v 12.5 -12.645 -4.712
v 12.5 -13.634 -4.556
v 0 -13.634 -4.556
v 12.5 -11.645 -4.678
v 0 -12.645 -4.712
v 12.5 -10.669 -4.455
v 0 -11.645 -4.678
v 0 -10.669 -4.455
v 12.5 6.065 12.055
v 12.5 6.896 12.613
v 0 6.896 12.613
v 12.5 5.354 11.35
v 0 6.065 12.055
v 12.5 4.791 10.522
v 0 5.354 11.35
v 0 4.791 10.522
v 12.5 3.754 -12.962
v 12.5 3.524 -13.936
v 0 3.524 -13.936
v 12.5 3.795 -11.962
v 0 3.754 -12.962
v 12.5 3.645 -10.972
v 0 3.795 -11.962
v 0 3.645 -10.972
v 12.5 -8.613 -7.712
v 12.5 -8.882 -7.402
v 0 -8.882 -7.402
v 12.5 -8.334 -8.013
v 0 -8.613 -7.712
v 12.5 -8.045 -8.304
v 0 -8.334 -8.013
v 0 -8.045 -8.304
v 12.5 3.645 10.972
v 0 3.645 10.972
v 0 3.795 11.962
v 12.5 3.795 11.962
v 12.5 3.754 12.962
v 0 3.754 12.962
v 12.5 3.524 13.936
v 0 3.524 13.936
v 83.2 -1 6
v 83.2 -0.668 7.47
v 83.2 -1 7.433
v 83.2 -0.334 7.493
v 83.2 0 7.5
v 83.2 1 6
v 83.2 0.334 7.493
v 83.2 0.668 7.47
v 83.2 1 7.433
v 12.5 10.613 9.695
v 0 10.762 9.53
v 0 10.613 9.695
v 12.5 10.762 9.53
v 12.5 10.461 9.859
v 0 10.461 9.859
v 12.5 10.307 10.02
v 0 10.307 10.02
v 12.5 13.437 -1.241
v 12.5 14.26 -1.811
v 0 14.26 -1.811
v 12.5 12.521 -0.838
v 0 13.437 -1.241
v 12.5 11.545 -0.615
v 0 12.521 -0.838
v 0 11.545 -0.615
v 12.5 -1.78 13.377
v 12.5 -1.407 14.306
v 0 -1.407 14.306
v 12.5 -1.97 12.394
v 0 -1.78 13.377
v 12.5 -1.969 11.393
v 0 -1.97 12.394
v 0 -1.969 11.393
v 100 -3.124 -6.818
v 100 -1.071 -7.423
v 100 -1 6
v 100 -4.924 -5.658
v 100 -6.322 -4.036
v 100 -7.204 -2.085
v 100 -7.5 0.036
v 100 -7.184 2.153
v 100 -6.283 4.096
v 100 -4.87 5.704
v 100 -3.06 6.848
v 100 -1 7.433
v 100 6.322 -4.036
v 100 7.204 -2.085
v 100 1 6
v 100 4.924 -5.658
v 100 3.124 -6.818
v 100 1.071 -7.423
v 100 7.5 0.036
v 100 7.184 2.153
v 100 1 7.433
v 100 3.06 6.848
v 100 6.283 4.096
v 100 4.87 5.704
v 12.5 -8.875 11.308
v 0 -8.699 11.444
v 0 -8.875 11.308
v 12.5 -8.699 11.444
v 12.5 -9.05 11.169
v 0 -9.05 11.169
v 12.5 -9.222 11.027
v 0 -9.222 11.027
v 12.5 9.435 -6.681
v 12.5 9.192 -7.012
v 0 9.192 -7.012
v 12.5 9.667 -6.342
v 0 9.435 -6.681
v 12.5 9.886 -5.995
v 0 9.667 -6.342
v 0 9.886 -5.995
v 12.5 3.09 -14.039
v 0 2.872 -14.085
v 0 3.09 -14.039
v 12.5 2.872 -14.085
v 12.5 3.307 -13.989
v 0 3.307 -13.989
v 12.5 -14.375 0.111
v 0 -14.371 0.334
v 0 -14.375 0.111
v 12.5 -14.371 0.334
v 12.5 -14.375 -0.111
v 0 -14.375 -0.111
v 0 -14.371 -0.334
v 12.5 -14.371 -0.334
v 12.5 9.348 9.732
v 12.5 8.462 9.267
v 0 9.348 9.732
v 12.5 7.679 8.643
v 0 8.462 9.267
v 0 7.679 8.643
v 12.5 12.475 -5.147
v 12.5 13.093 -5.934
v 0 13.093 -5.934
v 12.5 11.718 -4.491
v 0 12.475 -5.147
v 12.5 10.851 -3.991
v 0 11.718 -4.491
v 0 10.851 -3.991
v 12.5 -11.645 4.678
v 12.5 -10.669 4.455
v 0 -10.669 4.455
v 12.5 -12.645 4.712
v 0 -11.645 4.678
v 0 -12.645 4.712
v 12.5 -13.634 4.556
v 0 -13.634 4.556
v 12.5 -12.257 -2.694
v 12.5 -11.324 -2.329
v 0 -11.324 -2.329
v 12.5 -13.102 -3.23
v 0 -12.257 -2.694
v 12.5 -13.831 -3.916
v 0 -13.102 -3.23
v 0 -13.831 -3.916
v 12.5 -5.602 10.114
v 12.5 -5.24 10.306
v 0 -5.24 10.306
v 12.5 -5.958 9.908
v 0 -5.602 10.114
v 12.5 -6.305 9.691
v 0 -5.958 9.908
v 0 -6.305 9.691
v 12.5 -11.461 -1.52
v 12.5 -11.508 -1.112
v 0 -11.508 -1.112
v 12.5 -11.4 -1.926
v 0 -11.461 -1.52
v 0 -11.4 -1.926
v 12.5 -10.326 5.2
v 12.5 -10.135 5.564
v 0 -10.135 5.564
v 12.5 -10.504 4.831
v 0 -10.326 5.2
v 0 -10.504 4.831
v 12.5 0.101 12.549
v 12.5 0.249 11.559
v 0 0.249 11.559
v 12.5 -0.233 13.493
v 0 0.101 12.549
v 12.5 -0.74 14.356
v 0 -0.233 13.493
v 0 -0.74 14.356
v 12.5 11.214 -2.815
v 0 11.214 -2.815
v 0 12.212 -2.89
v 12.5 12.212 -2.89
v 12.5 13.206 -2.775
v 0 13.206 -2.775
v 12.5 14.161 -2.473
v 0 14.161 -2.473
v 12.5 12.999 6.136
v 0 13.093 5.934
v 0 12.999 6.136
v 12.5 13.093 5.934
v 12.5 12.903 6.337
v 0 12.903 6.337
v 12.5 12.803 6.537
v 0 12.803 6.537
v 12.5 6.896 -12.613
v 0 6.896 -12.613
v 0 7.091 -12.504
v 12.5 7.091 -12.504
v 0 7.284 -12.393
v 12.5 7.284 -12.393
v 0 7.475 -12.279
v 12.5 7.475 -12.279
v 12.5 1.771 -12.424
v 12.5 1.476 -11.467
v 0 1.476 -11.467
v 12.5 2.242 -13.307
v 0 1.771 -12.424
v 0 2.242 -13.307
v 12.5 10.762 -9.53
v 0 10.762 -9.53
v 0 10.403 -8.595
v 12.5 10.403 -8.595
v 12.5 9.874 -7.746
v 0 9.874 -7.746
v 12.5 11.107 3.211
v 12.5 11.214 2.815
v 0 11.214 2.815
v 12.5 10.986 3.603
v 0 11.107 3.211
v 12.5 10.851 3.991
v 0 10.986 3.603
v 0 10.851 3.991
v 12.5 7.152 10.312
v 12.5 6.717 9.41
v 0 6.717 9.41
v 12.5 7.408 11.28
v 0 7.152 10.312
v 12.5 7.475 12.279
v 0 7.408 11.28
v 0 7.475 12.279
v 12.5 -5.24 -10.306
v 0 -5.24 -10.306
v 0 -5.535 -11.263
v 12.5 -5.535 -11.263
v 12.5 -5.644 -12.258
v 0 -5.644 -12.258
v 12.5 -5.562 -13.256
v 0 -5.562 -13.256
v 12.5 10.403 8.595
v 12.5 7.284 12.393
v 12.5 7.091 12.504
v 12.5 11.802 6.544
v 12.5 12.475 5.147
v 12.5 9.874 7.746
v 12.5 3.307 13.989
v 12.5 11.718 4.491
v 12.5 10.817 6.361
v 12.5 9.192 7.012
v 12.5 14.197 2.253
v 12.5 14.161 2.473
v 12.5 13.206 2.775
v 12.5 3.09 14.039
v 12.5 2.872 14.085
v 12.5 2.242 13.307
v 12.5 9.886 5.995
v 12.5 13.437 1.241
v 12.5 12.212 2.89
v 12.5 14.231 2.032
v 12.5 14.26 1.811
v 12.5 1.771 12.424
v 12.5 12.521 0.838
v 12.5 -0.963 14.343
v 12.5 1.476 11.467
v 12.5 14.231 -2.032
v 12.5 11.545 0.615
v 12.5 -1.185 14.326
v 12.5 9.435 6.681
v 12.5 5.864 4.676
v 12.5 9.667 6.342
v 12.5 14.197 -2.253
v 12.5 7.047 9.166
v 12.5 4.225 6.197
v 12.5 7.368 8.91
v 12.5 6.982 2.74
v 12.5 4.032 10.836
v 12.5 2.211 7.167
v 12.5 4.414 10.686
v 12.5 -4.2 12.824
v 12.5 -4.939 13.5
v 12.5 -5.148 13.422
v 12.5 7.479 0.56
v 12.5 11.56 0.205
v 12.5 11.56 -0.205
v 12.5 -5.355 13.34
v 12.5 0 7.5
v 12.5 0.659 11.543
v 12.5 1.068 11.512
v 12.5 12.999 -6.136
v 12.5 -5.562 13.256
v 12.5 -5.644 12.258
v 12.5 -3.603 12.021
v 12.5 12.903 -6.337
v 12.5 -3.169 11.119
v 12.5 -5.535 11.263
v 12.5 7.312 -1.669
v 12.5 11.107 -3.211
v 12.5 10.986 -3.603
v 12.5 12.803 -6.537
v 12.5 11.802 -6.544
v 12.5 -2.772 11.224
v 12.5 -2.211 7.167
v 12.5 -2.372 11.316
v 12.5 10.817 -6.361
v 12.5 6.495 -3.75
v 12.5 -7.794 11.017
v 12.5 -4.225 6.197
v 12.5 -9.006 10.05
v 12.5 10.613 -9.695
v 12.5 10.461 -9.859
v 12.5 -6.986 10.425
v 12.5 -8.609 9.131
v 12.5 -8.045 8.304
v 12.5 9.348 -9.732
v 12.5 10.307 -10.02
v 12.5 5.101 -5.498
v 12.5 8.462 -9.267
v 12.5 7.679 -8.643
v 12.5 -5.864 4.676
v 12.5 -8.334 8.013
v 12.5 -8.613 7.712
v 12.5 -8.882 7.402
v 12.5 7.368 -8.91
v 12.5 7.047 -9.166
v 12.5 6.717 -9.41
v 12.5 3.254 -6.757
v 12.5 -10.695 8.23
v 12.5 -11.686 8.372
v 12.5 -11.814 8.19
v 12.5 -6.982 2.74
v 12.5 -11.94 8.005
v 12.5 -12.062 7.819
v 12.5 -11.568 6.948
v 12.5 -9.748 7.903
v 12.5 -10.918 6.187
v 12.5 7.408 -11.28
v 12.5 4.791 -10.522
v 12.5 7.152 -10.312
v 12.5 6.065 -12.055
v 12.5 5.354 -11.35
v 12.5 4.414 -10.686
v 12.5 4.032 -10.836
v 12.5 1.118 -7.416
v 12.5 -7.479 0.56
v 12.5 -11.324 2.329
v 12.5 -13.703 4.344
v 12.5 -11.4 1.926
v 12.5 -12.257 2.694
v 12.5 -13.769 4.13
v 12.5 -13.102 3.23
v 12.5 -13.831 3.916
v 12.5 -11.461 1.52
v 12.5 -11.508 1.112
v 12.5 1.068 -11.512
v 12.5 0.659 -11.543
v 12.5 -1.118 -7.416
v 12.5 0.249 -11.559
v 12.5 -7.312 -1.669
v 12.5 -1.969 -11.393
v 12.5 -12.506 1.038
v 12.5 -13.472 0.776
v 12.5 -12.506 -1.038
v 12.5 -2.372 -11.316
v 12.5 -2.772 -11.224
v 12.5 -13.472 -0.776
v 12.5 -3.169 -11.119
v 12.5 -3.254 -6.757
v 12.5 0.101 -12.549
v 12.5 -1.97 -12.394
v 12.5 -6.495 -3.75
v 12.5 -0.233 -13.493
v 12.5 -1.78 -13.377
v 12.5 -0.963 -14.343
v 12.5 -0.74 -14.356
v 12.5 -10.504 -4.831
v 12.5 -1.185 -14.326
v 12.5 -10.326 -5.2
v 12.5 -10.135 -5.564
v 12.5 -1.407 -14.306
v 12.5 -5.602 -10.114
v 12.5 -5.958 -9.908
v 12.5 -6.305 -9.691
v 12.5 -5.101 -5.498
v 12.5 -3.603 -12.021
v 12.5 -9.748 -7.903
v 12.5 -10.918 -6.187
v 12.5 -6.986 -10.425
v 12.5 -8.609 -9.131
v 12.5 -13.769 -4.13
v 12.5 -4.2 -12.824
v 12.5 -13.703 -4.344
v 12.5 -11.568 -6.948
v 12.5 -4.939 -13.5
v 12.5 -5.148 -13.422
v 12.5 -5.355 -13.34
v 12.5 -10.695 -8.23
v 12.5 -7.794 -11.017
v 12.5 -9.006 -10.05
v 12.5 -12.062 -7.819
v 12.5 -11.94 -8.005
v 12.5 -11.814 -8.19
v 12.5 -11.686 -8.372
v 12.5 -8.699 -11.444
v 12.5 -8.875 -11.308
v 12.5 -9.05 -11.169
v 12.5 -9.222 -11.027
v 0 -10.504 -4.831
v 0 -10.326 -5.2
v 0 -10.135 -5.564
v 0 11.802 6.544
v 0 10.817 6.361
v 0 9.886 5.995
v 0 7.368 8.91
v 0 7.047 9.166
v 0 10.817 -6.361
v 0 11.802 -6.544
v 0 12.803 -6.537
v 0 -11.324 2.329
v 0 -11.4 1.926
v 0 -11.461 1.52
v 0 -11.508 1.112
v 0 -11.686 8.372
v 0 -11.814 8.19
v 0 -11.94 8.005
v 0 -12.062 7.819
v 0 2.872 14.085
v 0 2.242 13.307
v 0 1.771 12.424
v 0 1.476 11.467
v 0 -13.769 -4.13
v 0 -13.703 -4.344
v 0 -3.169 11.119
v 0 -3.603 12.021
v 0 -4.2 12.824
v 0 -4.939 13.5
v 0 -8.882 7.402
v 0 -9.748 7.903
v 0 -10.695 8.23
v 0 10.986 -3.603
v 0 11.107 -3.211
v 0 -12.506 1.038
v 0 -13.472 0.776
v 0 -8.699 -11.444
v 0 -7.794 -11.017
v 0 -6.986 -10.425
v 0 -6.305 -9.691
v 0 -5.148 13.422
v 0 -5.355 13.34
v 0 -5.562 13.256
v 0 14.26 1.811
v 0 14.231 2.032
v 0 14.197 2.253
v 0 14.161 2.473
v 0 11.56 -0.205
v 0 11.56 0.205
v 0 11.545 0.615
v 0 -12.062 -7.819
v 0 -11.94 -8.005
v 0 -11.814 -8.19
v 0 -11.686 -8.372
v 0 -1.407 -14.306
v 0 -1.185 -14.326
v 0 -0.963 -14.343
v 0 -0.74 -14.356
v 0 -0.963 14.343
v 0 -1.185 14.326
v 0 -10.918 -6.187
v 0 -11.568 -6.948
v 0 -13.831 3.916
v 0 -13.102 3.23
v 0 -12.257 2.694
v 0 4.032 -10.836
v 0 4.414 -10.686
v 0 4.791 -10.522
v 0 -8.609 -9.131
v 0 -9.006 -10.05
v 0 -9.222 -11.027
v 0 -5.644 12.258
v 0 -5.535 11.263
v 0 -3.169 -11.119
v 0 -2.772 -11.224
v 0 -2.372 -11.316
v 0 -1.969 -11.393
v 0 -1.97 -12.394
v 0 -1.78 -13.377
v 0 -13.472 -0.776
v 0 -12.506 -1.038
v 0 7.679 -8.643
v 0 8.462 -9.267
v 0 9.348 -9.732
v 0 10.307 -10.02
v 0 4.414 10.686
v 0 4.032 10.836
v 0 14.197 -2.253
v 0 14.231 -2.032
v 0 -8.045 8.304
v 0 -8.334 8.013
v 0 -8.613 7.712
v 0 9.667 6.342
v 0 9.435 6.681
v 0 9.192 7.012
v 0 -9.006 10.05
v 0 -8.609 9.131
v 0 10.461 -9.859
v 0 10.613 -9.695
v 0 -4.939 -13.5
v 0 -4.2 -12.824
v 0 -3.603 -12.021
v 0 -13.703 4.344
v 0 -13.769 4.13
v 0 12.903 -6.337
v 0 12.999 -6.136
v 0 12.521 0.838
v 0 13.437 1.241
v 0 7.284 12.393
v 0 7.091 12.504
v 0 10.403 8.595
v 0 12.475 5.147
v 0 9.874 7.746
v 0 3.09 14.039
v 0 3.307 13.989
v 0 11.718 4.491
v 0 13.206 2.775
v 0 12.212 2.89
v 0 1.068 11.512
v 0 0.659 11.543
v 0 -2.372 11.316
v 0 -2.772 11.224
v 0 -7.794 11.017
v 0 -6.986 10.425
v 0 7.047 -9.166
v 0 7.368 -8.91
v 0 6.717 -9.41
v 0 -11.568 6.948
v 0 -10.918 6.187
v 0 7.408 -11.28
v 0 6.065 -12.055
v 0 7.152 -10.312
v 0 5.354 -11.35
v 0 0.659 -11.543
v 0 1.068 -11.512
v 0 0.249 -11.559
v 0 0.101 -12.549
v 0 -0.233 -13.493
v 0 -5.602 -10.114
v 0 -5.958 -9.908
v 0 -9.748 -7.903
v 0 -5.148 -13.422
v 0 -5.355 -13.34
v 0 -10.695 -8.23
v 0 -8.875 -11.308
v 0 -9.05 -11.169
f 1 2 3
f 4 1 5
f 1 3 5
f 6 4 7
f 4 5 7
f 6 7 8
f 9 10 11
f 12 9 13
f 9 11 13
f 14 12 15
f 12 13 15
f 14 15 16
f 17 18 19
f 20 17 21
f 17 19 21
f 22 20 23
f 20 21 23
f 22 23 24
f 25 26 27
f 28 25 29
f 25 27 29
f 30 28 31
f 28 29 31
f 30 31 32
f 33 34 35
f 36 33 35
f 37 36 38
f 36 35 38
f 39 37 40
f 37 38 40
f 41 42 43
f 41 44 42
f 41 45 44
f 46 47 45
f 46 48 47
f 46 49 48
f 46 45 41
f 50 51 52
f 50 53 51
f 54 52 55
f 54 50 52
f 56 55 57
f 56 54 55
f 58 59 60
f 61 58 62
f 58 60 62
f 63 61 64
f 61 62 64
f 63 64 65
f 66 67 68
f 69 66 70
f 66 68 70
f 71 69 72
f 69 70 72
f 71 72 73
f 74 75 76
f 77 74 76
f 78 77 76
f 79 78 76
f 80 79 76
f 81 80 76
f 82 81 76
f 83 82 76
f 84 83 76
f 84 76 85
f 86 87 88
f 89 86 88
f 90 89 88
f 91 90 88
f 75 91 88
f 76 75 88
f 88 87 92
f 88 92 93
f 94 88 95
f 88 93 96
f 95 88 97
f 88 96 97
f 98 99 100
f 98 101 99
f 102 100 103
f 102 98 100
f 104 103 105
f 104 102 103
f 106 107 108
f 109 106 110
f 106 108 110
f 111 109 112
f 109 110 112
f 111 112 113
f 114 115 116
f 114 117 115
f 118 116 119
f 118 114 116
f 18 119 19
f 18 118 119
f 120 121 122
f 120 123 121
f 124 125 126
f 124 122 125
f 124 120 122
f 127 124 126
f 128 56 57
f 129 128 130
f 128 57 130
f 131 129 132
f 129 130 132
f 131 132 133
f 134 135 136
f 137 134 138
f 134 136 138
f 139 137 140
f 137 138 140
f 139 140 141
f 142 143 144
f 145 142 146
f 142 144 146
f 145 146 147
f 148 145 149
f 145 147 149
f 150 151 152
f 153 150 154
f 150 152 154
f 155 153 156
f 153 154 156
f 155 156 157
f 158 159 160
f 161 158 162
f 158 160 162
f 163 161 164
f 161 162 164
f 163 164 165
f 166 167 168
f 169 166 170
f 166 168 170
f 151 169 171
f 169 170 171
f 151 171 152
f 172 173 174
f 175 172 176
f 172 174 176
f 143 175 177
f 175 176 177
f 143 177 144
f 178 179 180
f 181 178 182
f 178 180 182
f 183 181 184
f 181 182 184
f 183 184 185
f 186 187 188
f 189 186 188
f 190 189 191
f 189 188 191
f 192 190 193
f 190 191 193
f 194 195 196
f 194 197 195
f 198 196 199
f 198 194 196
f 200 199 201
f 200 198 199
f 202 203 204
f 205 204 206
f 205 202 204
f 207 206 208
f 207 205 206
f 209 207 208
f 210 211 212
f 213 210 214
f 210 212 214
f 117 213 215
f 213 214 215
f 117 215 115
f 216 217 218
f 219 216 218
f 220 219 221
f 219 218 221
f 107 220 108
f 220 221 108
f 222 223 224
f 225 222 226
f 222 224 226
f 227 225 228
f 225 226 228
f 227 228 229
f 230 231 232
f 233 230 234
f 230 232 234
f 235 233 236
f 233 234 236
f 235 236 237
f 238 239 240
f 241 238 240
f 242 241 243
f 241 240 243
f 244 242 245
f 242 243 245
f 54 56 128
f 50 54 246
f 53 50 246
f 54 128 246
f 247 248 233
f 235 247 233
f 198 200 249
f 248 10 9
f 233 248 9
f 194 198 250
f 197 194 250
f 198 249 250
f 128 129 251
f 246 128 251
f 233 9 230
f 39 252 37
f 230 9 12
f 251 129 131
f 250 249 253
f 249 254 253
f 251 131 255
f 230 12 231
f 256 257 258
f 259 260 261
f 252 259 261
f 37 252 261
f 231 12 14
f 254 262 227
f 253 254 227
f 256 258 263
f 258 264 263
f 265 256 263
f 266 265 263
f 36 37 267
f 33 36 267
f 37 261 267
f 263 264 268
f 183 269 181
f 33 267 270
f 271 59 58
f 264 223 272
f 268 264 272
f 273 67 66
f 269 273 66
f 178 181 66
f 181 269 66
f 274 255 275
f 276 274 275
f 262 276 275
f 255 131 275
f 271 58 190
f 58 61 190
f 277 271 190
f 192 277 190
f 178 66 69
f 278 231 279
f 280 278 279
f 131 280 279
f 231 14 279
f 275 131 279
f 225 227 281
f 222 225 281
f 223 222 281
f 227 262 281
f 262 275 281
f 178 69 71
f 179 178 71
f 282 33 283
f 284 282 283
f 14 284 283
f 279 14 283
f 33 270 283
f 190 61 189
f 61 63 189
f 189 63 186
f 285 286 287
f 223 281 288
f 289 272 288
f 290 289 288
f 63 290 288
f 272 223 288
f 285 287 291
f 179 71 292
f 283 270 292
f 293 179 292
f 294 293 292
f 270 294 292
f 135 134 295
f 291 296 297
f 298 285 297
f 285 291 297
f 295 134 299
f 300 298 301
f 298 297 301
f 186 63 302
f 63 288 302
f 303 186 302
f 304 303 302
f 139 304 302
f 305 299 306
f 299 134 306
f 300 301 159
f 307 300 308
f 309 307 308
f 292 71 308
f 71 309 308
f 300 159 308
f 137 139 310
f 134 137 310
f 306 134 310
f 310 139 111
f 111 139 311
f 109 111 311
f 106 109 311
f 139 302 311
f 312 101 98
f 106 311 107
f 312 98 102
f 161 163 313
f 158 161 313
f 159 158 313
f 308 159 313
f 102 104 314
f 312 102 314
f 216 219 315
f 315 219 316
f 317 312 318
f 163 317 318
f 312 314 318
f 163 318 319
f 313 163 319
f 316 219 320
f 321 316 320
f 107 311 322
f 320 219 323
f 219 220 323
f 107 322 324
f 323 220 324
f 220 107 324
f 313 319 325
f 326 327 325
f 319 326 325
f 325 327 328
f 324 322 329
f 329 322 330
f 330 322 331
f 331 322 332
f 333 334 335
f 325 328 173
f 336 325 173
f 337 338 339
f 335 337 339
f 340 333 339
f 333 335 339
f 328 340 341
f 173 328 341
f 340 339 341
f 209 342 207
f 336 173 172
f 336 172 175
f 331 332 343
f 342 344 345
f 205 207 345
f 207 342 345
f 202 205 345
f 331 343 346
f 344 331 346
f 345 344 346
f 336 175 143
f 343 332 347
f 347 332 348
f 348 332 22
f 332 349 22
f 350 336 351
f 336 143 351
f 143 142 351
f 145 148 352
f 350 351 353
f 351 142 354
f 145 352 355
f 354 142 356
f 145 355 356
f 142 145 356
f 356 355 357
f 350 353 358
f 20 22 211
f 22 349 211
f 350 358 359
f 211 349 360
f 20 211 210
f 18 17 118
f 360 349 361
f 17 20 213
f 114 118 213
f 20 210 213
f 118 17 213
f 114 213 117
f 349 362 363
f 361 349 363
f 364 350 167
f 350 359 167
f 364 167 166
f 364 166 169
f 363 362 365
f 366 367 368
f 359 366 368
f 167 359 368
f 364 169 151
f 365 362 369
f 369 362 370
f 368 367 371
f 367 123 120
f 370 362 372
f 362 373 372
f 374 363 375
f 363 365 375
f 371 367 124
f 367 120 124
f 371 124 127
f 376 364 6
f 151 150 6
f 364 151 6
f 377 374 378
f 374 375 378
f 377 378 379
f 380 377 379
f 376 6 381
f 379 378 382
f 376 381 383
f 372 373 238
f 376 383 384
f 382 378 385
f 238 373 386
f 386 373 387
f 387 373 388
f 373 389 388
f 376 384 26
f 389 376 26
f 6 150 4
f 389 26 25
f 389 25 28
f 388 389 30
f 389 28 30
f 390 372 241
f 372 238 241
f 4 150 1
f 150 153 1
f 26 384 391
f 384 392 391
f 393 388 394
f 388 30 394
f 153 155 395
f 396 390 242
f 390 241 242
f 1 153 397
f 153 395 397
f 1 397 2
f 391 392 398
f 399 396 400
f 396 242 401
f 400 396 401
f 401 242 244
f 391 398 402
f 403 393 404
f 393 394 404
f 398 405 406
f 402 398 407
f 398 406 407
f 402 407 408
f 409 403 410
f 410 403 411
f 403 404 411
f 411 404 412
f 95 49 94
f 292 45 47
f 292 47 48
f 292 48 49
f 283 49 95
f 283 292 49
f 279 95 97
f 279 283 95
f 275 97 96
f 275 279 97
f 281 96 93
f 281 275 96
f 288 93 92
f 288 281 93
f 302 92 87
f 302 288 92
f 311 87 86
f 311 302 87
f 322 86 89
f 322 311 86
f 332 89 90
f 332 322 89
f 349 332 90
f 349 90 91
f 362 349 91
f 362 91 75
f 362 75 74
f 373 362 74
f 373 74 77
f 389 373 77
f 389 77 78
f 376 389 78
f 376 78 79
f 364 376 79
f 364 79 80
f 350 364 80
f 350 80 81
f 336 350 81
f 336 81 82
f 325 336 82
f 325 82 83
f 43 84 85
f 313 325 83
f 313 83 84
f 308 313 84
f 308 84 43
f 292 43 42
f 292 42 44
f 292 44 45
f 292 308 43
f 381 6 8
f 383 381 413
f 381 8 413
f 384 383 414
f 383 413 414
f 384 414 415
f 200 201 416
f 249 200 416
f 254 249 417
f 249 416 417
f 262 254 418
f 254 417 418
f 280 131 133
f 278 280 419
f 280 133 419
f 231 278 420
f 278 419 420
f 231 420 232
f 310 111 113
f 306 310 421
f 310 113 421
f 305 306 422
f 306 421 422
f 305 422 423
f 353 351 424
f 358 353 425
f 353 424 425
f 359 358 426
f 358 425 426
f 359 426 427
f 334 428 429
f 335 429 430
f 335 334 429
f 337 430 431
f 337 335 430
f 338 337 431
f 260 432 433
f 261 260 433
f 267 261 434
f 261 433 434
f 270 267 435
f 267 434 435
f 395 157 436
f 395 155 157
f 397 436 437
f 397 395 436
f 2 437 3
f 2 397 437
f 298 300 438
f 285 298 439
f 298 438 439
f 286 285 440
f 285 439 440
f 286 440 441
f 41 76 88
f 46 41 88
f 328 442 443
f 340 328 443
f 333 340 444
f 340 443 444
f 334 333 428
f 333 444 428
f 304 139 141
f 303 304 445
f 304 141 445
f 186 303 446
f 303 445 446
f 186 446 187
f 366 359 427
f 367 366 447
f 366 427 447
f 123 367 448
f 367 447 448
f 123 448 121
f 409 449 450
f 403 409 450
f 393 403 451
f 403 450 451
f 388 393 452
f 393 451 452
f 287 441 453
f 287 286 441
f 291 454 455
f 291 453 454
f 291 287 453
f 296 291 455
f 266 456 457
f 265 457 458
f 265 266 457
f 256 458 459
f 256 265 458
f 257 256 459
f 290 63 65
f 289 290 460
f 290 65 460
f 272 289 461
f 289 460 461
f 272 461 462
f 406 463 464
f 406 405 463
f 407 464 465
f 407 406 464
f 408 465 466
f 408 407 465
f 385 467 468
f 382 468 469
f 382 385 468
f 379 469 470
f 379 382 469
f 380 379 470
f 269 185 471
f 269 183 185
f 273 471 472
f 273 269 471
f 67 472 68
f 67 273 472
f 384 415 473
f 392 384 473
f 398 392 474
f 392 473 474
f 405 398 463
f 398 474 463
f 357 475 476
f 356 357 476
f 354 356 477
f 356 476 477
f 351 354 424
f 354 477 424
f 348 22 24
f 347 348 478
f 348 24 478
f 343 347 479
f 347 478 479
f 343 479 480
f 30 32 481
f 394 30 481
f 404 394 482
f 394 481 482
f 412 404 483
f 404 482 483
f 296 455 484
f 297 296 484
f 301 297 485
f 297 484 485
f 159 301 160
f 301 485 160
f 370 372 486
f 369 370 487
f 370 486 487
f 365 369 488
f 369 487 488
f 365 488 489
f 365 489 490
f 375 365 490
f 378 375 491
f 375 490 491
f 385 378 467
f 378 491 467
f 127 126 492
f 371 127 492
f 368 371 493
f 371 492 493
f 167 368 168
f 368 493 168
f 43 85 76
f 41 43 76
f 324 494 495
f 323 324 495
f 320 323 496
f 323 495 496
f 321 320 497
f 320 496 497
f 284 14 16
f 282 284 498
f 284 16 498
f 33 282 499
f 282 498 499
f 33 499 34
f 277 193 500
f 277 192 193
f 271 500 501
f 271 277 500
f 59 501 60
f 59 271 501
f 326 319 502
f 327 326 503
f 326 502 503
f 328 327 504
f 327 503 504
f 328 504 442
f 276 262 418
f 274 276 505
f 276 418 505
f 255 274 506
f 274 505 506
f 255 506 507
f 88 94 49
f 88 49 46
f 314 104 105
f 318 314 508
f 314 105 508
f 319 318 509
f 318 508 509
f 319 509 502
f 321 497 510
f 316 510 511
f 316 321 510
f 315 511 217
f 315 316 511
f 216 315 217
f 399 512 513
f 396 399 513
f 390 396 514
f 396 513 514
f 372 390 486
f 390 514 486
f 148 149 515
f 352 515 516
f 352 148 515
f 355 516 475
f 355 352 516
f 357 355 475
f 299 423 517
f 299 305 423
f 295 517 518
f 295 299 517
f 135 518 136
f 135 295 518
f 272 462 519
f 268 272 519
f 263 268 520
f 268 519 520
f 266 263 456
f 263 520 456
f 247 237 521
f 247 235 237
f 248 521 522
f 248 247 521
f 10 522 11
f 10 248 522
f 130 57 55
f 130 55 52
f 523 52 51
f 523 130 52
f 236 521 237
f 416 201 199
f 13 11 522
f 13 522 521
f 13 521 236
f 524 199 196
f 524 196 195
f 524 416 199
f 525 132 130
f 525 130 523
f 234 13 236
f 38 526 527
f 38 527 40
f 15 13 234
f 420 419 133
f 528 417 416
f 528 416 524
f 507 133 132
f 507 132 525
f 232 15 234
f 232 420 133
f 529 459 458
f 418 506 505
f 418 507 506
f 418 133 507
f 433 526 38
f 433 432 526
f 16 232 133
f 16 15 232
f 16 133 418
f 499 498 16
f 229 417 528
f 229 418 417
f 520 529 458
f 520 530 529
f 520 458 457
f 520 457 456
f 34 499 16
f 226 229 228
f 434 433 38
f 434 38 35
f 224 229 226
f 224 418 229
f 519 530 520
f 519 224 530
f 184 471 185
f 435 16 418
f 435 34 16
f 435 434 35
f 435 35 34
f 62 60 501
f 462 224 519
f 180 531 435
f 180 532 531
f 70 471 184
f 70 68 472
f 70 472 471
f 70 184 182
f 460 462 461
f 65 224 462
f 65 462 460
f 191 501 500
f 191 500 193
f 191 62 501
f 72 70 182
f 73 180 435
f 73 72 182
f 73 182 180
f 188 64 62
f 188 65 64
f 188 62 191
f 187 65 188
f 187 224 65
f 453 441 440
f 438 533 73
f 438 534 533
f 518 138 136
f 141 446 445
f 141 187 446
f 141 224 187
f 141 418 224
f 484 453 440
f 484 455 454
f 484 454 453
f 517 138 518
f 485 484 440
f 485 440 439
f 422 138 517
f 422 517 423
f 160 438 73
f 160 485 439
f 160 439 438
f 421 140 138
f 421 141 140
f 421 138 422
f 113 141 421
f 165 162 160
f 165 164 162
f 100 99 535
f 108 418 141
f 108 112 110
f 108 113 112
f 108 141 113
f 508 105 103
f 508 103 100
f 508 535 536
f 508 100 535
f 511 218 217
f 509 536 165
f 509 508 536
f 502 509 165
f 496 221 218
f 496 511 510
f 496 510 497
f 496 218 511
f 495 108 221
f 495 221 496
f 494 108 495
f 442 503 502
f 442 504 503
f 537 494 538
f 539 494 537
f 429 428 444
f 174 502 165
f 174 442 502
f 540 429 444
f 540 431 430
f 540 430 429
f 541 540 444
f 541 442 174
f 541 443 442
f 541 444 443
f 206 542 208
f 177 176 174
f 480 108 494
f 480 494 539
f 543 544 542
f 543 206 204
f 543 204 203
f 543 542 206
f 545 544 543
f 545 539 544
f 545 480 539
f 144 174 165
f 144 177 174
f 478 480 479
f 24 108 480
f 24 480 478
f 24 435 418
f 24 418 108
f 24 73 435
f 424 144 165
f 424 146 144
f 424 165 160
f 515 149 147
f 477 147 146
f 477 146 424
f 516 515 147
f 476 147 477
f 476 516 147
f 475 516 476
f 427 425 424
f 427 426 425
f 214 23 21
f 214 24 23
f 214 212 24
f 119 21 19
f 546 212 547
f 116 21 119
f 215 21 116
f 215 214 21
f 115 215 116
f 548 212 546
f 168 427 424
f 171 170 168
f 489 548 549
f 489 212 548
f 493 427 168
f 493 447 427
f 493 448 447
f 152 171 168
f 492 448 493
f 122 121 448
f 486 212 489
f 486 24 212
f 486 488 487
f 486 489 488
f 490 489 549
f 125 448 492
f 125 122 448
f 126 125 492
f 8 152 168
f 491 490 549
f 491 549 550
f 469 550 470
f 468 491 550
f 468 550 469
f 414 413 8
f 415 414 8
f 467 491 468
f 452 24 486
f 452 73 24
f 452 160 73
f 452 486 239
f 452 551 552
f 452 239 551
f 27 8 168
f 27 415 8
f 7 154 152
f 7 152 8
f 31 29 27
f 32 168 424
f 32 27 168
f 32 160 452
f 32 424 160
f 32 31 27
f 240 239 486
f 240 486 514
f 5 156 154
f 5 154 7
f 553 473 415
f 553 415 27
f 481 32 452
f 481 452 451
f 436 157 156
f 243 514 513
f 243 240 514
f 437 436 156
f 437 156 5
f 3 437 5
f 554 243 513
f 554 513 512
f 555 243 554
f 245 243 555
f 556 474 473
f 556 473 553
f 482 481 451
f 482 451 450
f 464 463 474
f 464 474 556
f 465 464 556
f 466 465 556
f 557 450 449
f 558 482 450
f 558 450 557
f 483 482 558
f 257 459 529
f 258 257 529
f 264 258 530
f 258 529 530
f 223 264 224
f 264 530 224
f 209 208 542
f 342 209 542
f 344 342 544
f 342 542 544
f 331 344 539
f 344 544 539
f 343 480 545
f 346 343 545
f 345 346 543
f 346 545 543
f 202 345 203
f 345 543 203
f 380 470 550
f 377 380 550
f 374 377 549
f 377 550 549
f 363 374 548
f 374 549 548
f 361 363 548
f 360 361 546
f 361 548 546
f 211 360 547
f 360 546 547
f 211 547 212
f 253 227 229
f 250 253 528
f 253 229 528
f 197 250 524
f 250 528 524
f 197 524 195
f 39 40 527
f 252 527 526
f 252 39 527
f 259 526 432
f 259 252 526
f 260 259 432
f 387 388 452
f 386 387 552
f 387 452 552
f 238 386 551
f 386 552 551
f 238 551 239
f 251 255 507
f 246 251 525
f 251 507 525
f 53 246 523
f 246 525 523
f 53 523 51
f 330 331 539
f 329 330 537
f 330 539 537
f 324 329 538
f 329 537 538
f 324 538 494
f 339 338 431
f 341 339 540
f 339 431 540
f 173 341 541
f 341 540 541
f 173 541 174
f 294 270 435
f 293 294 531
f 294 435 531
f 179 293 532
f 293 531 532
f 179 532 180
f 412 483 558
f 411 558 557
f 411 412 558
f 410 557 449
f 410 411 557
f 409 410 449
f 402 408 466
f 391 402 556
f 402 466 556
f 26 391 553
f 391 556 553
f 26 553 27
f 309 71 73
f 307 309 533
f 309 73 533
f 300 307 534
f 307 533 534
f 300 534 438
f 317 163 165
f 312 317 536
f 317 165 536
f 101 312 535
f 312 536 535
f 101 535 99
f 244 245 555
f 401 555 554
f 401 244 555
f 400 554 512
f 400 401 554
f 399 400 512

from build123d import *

# Parameters (mm, degrees)
BASPROSKE_W         = 12.5
BASPROSKE_H         = 14.375
TOOTHCUT_DEPTH      = 24.864853865
TEETHCUTS_COUNT     = 21
TEETHCUTS_ANGLE     = 342.857142857
BORSKE_R            = 4
BORE_DEPTH          = 50.0000508
SKETCH1_R           = 7.5
BOSS_EXTRUDE1_DEPTH = 100
SKETCH2_W           = 3
SKETCH2_H           = 2
CUT_EXTRUDE1_DEPTH  = 16.8


with BuildPart() as part:
    # BasProSke → Base-Revolve (revolve)
    with BuildSketch(Plane(origin=(0, 0, 0), x_dir=(1, 0, 0), z_dir=(0, 1, 0)), mode=Mode.PRIVATE) as base_revolve_sk:
        with Locations((6.25, 7.1875)):
            Rectangle(BASPROSKE_W, BASPROSKE_H)
    revolve(base_revolve_sk.sketch.rotate(Axis((-10, 0, 0), (1, 0, 0)), 180), axis=Axis((-10, 0, 0), (1, 0, 0)))

    # TooCutSke → ToothCut (cut, through all)
    with BuildSketch(Plane(origin=(0, 0, 0), x_dir=(0, 0, -1), z_dir=(1, 0, 0))):
        with BuildLine():
            ThreePointArc((0.615260942, 11.545117419), (0, 11.5615), (-0.615260942, 11.545117419))
            ThreePointArc((-0.615260942, 11.545117419), (-1.023565158, 13.002884474), (-1.830858013, 14.283538746))
            ThreePointArc((-1.830858013, 14.283538746), (0, 14.4004), (1.830858013, 14.283538746))
            ThreePointArc((1.830858013, 14.283538746), (1.023565158, 13.002884474), (0.615260942, 11.545117419))
        make_face()
    toothcut = extrude(amount=TOOTHCUT_DEPTH, mode=Mode.SUBTRACT)

    # TeethCuts: ToothCut ×21 about axis
    teethcuts_axis = Axis((-10, 0, 0), (1, 0, 0))
    for i in range(1, TEETHCUTS_COUNT):
        add(toothcut.rotate(teethcuts_axis, i * TEETHCUTS_ANGLE / (TEETHCUTS_COUNT - 1)), mode=Mode.SUBTRACT)

    # BorSke → Bore (cut, symmetric)
    with BuildSketch(Plane(origin=(0, 0, 0), x_dir=(0, 0, -1), z_dir=(1, 0, 0))):
        with Locations(Location((0, 0, 0), (0, 0, 180))):
            Circle(BORSKE_R)
    extrude(amount=BORE_DEPTH, both=True, mode=Mode.SUBTRACT)

    # Sketch1 → Boss-Extrude1 (add)
    with BuildSketch(Plane.ZY):
        Circle(SKETCH1_R)
    extrude(amount=-BOSS_EXTRUDE1_DEPTH)

    # Sketch2 → Cut-Extrude1 (cut)
    with BuildSketch(Plane(origin=(100, 0, 0), x_dir=(0, 0, -1), z_dir=(1, 0, 0))):
        with Locations((-7.5, 0)):
            Rectangle(SKETCH2_W, SKETCH2_H)
    extrude(amount=-CUT_EXTRUDE1_DEPTH, mode=Mode.SUBTRACT)


solid = part.part
